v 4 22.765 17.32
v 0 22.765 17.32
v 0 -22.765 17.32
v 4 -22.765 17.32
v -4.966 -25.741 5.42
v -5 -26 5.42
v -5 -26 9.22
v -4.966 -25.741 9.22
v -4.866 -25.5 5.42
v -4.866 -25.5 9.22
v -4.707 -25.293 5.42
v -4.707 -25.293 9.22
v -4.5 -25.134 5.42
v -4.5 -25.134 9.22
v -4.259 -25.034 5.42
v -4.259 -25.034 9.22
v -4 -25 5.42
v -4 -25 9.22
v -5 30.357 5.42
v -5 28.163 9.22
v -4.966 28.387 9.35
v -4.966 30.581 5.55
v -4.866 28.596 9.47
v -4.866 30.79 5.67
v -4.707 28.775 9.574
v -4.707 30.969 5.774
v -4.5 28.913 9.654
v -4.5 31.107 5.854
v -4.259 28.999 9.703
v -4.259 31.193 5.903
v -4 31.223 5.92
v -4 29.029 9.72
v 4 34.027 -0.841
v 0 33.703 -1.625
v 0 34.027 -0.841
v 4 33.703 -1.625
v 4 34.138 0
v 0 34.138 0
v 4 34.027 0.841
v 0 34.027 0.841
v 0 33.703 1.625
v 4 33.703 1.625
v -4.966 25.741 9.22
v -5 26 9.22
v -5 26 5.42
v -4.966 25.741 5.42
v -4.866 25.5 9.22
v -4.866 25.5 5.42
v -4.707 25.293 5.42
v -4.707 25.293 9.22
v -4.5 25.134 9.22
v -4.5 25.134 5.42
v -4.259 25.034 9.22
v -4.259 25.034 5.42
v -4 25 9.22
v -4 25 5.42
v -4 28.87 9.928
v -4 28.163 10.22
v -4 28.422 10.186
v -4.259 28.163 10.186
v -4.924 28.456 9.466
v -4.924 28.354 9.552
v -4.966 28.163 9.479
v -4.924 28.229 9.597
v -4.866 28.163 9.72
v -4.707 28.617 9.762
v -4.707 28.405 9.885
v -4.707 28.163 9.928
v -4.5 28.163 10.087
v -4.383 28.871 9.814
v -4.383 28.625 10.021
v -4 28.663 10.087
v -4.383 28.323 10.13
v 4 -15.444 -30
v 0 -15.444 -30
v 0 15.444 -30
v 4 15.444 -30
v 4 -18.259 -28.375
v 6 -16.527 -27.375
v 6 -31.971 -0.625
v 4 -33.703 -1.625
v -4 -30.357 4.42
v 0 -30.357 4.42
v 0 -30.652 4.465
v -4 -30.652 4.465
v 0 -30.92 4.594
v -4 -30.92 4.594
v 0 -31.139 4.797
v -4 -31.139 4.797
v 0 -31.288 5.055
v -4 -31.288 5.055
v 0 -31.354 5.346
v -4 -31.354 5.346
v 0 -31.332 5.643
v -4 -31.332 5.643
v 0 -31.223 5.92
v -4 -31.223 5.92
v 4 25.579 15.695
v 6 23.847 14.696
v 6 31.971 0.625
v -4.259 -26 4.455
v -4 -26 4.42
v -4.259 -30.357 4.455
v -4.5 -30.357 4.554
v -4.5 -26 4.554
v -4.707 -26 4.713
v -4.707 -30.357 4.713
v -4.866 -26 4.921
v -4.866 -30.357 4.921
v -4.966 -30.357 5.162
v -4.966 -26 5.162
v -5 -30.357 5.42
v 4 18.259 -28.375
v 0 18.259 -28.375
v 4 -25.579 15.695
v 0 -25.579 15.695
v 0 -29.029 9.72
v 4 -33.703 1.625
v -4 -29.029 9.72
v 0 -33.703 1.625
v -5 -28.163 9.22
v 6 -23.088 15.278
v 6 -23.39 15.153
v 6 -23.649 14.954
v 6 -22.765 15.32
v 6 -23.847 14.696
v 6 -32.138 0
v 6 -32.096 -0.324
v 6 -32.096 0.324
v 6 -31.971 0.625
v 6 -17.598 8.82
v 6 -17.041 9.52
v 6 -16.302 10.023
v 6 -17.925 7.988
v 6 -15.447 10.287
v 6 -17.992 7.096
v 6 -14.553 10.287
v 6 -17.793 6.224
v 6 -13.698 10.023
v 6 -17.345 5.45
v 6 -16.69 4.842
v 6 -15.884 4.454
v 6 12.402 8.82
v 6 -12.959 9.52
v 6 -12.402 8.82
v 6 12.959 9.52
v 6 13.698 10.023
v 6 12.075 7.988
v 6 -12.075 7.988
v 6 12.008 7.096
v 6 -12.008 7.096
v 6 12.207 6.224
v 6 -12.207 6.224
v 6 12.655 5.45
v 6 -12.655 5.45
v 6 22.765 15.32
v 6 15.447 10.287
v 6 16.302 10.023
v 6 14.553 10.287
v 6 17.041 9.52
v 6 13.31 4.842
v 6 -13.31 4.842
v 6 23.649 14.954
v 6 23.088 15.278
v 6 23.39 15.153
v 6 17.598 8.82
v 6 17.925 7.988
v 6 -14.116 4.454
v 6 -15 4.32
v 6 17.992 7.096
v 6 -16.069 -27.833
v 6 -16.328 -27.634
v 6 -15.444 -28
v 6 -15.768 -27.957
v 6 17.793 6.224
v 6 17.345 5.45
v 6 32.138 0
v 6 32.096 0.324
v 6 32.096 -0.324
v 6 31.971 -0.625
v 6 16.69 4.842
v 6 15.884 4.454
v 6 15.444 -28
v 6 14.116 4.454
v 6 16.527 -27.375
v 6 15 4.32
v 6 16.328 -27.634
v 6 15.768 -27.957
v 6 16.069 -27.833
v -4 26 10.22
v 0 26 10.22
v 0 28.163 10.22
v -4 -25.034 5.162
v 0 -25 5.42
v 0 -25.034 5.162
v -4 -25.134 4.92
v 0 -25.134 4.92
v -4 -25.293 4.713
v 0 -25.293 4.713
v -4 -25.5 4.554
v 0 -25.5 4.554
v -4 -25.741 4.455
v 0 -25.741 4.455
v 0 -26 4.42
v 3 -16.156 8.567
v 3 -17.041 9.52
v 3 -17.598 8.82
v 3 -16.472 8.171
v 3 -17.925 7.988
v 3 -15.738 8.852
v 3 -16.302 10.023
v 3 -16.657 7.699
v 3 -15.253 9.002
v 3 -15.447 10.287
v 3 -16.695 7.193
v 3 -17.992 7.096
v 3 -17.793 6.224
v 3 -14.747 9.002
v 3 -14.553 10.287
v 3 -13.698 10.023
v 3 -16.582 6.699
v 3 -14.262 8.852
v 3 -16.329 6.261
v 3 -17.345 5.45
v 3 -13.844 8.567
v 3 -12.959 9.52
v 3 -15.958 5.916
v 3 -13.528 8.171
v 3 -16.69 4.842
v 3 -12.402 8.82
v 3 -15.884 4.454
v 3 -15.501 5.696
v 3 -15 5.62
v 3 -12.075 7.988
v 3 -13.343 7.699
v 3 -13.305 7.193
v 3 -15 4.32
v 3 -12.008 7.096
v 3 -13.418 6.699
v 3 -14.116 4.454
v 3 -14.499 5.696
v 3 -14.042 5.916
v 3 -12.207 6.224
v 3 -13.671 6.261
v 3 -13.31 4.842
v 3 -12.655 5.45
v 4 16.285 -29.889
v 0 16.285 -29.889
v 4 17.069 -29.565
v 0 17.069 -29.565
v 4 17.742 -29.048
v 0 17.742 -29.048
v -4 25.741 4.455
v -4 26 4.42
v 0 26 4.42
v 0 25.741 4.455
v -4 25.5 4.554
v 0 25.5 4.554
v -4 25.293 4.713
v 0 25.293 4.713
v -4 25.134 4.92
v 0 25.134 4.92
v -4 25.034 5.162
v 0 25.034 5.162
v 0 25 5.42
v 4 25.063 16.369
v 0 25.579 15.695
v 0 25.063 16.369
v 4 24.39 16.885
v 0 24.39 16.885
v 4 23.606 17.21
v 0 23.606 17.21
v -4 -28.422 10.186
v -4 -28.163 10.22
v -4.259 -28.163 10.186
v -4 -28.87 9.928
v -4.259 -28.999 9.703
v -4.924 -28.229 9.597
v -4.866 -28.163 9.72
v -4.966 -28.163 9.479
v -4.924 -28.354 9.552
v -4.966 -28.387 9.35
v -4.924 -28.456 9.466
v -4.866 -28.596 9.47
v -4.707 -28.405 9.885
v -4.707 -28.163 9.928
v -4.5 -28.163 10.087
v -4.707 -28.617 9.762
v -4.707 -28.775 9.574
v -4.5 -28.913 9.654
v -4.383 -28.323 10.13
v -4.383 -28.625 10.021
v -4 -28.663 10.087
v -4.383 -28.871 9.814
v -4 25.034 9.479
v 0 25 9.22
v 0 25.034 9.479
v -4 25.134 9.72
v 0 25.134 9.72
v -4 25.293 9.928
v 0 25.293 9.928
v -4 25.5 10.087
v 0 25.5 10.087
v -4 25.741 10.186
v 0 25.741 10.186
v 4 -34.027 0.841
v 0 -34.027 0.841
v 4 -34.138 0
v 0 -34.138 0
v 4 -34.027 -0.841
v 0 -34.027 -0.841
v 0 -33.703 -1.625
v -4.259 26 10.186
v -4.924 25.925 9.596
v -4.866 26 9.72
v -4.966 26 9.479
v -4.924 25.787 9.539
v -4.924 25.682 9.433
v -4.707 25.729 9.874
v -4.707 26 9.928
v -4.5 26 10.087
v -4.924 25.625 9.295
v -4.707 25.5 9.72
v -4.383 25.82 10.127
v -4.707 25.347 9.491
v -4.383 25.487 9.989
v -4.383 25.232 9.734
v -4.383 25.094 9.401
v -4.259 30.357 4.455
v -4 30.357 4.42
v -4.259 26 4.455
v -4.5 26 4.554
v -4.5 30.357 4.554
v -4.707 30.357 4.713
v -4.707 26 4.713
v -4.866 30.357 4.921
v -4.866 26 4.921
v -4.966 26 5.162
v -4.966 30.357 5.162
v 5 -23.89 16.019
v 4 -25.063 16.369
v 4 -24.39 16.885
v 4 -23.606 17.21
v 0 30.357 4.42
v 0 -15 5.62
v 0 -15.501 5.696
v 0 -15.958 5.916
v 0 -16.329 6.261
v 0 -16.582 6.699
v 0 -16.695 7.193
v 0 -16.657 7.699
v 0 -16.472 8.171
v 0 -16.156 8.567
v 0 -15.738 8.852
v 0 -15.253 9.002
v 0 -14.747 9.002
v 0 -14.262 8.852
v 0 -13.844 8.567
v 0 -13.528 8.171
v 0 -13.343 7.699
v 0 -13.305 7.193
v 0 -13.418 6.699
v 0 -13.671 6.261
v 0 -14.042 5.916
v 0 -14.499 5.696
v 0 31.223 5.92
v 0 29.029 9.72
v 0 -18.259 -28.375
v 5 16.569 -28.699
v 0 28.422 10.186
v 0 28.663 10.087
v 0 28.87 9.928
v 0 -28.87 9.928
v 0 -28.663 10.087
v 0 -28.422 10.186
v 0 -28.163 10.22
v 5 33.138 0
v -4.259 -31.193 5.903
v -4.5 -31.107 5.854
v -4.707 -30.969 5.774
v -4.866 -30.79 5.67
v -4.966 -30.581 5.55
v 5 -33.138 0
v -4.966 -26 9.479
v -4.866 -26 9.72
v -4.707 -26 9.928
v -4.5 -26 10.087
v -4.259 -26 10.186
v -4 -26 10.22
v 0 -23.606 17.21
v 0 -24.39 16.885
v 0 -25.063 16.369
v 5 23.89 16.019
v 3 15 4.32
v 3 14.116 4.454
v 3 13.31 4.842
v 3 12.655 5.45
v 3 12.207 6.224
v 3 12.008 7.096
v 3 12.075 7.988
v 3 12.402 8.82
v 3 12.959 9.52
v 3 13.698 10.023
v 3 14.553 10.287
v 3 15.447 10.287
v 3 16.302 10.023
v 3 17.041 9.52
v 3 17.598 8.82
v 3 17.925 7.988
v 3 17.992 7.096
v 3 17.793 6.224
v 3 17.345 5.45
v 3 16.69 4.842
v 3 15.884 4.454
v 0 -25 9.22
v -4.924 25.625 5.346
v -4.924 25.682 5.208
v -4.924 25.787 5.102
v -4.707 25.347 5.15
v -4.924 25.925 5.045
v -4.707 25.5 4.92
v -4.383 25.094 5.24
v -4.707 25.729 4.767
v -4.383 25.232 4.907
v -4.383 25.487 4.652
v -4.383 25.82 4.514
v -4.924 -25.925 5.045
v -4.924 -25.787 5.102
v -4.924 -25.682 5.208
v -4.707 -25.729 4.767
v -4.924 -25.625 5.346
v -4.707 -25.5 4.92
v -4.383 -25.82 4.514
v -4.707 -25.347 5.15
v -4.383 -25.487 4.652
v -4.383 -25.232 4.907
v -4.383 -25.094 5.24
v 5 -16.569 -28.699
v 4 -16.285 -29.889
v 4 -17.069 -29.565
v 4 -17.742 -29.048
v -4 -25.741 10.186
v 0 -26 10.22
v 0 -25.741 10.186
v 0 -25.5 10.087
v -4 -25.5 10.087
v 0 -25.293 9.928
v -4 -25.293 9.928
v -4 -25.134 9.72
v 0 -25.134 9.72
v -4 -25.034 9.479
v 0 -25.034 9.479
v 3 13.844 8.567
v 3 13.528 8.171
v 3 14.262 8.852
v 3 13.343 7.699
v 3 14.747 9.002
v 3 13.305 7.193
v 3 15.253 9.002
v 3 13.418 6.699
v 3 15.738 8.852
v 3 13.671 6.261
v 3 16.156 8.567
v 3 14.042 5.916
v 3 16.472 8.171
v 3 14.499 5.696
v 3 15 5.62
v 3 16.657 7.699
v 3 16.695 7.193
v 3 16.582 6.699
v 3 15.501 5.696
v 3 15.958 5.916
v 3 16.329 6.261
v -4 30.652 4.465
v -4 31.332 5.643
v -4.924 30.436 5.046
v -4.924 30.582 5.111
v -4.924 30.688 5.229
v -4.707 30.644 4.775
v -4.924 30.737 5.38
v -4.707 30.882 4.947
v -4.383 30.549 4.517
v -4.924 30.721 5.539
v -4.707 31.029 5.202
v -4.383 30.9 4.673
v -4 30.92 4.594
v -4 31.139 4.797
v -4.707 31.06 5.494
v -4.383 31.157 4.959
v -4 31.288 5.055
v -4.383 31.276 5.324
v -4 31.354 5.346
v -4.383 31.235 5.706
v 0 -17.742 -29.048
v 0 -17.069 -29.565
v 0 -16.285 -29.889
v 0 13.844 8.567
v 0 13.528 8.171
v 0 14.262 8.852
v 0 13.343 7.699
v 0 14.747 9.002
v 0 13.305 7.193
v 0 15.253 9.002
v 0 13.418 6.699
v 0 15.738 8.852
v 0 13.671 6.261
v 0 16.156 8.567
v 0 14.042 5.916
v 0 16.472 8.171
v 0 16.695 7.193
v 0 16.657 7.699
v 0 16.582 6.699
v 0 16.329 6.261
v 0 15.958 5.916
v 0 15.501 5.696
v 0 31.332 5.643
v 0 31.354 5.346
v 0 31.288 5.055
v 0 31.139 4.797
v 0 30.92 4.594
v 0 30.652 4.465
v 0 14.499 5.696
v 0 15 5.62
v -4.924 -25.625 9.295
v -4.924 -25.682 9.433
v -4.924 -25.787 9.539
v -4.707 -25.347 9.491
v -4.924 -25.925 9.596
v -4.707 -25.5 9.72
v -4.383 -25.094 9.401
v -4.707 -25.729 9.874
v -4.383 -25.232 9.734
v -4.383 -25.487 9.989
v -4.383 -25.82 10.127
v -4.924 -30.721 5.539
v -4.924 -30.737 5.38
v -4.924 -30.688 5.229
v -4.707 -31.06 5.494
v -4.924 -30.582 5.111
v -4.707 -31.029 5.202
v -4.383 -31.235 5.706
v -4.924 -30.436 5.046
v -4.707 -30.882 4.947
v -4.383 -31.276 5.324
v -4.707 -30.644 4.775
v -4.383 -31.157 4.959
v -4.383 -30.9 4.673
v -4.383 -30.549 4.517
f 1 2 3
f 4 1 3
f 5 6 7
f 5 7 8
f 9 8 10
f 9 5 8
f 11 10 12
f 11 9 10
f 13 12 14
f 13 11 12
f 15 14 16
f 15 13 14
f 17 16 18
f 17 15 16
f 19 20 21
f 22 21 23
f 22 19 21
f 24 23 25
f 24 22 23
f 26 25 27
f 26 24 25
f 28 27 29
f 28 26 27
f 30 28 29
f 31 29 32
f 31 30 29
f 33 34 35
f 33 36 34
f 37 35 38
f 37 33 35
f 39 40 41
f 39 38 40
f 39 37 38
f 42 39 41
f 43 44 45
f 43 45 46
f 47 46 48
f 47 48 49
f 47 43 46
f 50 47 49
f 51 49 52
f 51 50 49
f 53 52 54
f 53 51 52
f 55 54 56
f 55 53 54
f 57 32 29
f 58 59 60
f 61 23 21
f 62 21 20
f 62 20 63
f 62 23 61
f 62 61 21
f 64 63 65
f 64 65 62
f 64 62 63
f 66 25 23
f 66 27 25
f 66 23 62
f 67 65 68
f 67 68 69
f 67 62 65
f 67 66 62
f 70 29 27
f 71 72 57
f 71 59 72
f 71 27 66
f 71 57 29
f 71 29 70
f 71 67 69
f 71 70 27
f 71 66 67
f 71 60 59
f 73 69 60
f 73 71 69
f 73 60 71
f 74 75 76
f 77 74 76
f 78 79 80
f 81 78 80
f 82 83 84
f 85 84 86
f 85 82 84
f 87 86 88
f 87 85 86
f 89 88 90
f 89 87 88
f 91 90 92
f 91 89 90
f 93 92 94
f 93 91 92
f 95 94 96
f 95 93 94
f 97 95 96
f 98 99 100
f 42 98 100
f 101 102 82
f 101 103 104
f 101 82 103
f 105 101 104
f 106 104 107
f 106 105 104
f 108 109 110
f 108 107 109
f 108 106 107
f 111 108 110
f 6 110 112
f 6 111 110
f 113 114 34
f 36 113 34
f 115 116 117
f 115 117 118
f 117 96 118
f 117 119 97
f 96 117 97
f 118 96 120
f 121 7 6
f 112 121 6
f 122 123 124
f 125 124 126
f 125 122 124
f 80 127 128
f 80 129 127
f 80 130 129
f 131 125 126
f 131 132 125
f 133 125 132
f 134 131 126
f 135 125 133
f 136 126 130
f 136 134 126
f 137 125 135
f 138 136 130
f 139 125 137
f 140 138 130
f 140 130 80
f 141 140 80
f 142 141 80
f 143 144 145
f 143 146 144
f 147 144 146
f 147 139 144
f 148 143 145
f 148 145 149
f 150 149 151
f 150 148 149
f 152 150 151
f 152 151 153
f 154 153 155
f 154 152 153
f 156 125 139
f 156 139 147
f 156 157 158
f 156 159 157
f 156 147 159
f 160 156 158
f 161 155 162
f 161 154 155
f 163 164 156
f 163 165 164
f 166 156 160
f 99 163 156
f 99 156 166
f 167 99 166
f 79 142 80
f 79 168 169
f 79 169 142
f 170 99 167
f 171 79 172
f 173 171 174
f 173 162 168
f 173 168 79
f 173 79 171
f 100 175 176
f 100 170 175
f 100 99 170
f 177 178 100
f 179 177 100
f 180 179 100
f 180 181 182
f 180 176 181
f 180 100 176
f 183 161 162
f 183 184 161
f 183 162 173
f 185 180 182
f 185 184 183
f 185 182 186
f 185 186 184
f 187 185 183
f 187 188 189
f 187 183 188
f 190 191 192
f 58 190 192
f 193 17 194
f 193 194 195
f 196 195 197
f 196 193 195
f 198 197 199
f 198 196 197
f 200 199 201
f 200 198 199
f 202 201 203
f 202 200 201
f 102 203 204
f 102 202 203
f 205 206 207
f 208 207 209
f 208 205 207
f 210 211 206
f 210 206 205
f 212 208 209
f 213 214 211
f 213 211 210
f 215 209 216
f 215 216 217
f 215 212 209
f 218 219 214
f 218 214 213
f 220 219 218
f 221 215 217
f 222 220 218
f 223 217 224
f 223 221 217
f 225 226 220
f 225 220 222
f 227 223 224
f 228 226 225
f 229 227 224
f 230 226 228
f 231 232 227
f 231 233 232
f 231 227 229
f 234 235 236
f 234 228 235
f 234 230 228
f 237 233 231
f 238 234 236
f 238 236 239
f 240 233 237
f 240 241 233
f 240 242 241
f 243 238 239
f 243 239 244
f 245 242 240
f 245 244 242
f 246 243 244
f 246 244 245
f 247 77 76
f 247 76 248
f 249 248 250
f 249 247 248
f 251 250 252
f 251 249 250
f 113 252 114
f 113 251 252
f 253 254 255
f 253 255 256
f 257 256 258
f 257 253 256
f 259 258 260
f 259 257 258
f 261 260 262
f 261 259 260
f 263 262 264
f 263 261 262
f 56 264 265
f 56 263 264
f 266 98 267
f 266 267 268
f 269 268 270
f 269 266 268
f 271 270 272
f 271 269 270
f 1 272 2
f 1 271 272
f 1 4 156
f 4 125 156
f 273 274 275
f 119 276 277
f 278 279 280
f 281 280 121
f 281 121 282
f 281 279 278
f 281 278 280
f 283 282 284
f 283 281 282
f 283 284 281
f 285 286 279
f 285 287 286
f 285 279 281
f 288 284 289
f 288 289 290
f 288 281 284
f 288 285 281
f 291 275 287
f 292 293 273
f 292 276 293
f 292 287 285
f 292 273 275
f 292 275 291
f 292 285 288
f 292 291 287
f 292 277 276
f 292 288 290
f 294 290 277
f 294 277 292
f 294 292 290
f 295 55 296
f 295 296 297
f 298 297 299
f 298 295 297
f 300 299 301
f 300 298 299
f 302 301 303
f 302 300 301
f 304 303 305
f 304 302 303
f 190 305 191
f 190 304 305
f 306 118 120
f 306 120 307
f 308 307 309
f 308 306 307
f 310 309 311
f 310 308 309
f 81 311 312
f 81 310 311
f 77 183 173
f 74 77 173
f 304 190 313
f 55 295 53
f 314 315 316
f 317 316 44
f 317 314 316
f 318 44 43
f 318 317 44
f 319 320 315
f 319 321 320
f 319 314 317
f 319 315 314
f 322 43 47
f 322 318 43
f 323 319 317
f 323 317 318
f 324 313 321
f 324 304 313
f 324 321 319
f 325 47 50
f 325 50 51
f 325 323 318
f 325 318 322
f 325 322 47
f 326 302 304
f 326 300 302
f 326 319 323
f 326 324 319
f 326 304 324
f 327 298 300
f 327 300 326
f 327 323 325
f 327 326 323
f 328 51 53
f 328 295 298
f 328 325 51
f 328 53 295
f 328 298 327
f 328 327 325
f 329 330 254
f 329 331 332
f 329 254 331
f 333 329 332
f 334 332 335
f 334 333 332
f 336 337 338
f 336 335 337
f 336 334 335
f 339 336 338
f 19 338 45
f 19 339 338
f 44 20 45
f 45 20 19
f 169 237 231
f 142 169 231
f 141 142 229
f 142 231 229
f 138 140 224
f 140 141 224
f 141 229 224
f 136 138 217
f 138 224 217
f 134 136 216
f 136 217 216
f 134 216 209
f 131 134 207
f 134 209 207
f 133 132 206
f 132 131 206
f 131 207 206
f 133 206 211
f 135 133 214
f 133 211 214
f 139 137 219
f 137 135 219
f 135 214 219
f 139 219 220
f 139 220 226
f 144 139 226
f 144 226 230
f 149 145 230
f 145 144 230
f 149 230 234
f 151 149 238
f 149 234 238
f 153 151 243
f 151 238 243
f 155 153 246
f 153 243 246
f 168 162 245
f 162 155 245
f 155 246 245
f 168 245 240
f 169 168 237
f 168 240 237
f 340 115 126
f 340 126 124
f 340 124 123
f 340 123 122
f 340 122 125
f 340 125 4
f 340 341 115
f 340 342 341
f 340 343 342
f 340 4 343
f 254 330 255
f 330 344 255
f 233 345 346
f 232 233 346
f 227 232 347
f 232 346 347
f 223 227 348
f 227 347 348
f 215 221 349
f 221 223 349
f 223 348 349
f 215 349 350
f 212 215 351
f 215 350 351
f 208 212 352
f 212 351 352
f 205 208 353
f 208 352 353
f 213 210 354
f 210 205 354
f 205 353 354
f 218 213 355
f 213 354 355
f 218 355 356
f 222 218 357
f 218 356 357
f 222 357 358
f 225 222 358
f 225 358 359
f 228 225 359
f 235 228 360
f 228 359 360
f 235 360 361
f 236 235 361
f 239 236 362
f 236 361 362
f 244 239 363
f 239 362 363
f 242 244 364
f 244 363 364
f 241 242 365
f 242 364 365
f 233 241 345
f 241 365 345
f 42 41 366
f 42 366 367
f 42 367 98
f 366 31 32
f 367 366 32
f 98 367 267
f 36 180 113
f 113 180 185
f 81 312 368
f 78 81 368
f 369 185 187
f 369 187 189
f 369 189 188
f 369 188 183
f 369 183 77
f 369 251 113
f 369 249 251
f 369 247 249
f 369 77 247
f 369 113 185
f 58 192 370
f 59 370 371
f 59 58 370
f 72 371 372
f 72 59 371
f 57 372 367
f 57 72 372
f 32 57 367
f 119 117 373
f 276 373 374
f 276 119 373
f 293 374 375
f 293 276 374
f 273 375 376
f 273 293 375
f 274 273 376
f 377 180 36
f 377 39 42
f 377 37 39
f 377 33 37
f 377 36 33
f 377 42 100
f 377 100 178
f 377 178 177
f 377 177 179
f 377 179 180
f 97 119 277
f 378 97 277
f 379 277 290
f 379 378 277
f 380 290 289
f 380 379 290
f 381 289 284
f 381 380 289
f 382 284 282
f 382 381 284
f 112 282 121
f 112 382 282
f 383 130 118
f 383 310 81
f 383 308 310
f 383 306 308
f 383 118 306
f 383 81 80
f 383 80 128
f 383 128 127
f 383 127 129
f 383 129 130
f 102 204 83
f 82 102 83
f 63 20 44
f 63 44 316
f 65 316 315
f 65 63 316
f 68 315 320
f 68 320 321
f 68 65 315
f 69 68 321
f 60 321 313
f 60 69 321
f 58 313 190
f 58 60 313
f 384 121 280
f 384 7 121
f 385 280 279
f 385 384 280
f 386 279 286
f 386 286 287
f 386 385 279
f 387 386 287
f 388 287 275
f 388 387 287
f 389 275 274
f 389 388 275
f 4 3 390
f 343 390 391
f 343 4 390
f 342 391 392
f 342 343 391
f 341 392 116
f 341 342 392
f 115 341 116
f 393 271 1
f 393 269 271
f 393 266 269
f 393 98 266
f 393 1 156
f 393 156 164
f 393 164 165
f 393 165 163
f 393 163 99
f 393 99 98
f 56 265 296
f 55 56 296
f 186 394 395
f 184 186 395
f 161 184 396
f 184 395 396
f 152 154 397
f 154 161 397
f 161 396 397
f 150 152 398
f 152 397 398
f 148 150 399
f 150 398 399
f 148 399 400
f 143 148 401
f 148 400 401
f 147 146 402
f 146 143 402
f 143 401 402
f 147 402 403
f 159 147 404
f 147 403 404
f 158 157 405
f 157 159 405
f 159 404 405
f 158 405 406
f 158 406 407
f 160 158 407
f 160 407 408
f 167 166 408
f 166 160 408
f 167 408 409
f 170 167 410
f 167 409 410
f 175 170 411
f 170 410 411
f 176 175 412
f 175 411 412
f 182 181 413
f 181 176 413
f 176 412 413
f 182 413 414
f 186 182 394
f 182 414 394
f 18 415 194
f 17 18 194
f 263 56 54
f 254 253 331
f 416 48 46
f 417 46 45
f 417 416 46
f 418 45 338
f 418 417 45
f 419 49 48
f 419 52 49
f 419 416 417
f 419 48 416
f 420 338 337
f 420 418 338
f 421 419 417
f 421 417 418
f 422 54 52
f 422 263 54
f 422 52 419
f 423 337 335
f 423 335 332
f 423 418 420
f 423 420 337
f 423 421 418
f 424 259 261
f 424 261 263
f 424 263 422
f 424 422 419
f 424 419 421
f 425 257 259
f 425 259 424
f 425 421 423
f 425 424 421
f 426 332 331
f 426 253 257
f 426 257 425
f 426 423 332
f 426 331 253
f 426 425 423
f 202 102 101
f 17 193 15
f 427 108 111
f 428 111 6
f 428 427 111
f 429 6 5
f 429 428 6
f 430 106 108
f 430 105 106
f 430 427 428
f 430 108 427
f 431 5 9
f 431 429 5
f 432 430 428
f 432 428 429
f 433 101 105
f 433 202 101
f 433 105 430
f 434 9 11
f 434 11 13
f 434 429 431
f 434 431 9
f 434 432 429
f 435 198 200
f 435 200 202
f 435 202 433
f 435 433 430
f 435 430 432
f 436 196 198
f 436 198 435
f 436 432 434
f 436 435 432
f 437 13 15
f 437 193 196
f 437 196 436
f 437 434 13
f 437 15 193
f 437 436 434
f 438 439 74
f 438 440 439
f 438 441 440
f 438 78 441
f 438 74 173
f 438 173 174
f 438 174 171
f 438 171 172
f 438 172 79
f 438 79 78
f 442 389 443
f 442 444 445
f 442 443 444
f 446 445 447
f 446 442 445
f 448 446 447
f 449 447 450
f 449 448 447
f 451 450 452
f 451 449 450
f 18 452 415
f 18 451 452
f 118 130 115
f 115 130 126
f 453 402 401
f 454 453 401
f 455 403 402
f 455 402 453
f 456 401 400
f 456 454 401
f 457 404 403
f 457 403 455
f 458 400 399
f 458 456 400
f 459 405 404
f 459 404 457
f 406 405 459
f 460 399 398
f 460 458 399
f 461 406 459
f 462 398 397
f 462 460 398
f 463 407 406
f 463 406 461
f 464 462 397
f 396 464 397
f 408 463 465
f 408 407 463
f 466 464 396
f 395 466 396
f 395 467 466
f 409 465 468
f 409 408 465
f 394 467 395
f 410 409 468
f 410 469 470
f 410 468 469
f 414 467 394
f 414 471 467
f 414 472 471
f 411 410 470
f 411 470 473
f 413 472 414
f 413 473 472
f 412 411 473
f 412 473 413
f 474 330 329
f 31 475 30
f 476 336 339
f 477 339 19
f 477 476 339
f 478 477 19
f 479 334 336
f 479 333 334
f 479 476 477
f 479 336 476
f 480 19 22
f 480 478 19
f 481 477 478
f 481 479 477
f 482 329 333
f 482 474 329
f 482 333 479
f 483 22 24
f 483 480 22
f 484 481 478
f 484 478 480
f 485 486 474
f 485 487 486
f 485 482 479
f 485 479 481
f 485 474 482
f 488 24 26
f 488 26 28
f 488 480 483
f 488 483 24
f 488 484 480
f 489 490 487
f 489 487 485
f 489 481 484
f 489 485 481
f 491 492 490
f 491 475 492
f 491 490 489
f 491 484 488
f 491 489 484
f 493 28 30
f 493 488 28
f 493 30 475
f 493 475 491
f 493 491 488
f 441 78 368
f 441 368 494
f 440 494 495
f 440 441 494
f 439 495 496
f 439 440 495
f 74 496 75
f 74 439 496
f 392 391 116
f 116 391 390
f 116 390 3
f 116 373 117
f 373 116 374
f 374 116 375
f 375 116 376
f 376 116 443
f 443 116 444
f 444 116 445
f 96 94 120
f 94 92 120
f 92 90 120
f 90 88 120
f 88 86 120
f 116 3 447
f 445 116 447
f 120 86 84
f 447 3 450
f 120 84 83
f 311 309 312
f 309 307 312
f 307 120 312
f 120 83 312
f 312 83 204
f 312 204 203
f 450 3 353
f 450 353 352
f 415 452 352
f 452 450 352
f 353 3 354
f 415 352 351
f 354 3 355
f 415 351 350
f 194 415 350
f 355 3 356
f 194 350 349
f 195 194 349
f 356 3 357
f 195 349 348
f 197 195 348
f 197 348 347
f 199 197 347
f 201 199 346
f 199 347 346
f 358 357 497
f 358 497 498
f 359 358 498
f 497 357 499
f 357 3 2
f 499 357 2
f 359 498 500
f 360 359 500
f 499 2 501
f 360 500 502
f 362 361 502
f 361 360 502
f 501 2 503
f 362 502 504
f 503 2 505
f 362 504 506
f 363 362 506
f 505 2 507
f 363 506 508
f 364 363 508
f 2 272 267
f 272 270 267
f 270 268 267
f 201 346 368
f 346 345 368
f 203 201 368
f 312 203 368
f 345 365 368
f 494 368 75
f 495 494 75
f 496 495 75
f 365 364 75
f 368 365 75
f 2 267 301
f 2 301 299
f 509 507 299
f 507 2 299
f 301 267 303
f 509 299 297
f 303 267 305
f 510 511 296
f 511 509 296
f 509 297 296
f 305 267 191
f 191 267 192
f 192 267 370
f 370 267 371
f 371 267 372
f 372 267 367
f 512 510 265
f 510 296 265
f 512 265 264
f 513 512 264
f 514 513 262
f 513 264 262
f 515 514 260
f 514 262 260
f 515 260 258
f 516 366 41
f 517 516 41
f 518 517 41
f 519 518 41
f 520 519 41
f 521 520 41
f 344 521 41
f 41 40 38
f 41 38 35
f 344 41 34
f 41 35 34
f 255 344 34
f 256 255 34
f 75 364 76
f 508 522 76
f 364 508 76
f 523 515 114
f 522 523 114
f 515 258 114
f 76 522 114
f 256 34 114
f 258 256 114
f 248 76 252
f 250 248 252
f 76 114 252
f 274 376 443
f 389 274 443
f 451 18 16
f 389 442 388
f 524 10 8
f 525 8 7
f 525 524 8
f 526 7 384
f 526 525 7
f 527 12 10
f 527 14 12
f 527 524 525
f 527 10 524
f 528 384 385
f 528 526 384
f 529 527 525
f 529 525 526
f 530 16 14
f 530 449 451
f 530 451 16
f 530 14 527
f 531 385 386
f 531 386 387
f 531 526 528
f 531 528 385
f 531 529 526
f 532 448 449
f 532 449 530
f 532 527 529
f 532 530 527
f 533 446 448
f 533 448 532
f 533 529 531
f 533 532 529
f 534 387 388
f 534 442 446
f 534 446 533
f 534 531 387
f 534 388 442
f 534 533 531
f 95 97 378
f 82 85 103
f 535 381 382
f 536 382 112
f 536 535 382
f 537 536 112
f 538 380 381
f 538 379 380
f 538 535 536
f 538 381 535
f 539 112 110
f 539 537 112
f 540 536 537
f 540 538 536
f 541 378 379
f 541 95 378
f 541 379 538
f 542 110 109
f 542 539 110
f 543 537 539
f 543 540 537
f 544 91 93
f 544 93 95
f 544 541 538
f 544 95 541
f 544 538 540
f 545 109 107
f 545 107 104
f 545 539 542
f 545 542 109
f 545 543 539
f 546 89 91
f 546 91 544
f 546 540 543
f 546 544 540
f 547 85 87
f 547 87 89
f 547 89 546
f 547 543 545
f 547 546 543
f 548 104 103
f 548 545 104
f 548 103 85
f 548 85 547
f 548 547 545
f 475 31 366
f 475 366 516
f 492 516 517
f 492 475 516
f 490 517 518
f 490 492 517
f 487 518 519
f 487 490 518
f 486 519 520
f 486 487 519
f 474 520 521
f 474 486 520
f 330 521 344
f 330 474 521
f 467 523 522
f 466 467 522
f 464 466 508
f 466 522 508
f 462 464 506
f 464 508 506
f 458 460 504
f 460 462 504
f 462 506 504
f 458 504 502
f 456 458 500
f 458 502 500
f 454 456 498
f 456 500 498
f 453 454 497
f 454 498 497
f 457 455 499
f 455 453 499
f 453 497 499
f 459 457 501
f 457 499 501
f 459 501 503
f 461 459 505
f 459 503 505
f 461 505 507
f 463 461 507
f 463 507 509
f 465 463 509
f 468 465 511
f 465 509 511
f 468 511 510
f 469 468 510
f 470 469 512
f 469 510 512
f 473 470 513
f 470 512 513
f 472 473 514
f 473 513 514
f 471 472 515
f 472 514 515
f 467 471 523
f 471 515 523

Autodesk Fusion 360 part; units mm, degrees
sketch "Sketch1" plane through (0, 0, 0) normal (1, 0, 0) x (0, 0, -1)
  line L0 (17.3205, -30) -> (34.641, 0)
  line L1 (34.641, 0) -> (17.3205, 30)
  line L2 (17.3205, 30) -> (-17.3205, 30)
  line L3 (-17.3205, 30) -> (-34.641, 0)
  line L4 (-34.641, 0) -> (-17.3205, -30)
  line L5 (-17.3205, -30) -> (17.3205, -30)
  line L6 (-17.3205, 30) -> (2.6795, 30) construction
  line L7 (2.6795, 30) -> (2.6795, -30) construction
  line L8 (2.6795, -30) -> (-17.3205, -30) construction
  line L9 (-17.3205, -30) -> (-17.3205, 30) construction
  line L10 (-17.3205, 0) -> (2.6795, 0)
  line L11 (-17.3205, 30) -> (-17.3205, 0)
  line L12 (-17.3205, 0) -> (-17.3205, -30)
  line L13 (-17.3205, 0) -> (2.6795, -30) construction
  line L14 (-17.3205, 0) -> (2.6795, 30) construction
  circle A0 centre (-7.3205, 15) radius 1.7
  circle A1 centre (-7.3205, -15) radius 1.7
  circle A2 centre (-7.3205, 15) radius 3
  circle A3 centre (-7.3205, -15) radius 3
  line L15 (-7.3205, 30) -> (-7.3205, -30) construction
  line L16 (-4.4205, 25) -> (-10.2205, 25)
  line L17 (-10.2205, 25) -> (-10.2205, 35)
  line L18 (-10.2205, 35) -> (-4.4205, 35)
  line L19 (-4.4205, 35) -> (-4.4205, 25)
  line L20 (-4.4205, 25) -> (-10.2205, 35) construction
  line L21 (-10.2205, 25) -> (-4.4205, 35) construction
  line L22 (-4.4205, -35) -> (-10.2205, -35)
  line L23 (-10.2205, -35) -> (-10.2205, -25)
  line L24 (-10.2205, -25) -> (-4.4205, -25)
  line L25 (-4.4205, -25) -> (-4.4205, -35)
  line L26 (-4.4205, -35) -> (-10.2205, -25) construction
  line L27 (-10.2205, -35) -> (-4.4205, -25) construction
  line L28 (-17.3205, 30) -> (-17.3205, -30)
  line L29 (-17.3205, -30) -> (-21.5905, -30)
  line L30 (-21.5905, -30) -> (-21.5905, 30)
  line L31 (-21.5905, 30) -> (-17.3205, 30)
  line L32 (30, -17.3205) -> (30, 17.3205)
  line L33 (30, 17.3205) -> (0, 34.641)
  line L34 (0, 34.641) -> (-30, 17.3205)
  line L35 (-30, 17.3205) -> (-30, -17.3205)
  line L36 (-30, -17.3205) -> (0, -34.641)
  line L37 (0, -34.641) -> (30, -17.3205)
  point P0 (-7.3205, 30)
  point P1 (-7.3205, -30)
  dimension "d1" = 30
  dimension "d2" = 20
  dimension "d3" = 3.4
  dimension "d4" = 3.4
  dimension "d5" = 6
  dimension "d6" = 6
  dimension "d7" = 5.8
  dimension "d8" = 10
  dimension "d9" = 5.8
  dimension "d10" = 10
  dimension "d11" = 4.27
  dimension "d12" = 30
extrude "Extrude1" add sketch "Sketch1" along normal blind 6 contours L0 L1 L2 L5 L11 L12 L16 L17 L19 L23 L24 L25 L28 L32 L33 L34 L36 L37 | L0 L32 L37 | L5 L25 L36 L37 | L5 L25 L36 | L5 L23 L24 L25 L36 | L1 L32 L33 | L2 L19 L33 L34 | L2 L16 L17 L19 L34 | L2 L19 L34
extrude "Extrude2" add sketch "Sketch1" against normal blind 5 contours L5 L25 L36 | L5 L23 L24 L25 L36 | L2 L16 L17 L19 L34 | L2 L19 L34
extrude "Extrude3" add sketch "Sketch1" along normal blind 3 contours A2 | A3
fillet "Fillet1" radius 3.25 6 edges at (3, -34.641, 0) (3, -17.3205, -30) (3, 17.3205, -30) (3, 34.641, 0) (3, 24.641, 17.3205) (3, -24.641, 17.3205)
chamfer "Chamfer1" distance 2 angle 45 12 edges at (6, -25.9808, -15) (6, -17.0691, -29.5646) (6, 0, -30) (6, 17.0691, -29.5646) (6, 25.9808, -15) (6, 34.1382, 0) (6, 29.641, 8.6603) (6, 24.3896, 16.8851) (6, 0, 17.3205) (6, -24.3896, 16.8851) (6, -29.641, 8.6603) (6, -34.1382, 0)
fillet "Fillet2" radius 1 9 edges at (-2.5, 25, 4.4205) (-2.5, 25, 10.2205) (-2.5, -32.0888, 4.4205) (-2.5, -28.7402, 10.2205) (-2.5, -25, 10.2205) (-2.5, -25, 4.4205) (-5, -25, 7.3205) (-2.5, 28.7402, 10.2205) (-2.5, 32.0888, 4.4205) 2 faces at (-5, -28.6097, 6.3538) (-5, 28.6097, 6.3538)
